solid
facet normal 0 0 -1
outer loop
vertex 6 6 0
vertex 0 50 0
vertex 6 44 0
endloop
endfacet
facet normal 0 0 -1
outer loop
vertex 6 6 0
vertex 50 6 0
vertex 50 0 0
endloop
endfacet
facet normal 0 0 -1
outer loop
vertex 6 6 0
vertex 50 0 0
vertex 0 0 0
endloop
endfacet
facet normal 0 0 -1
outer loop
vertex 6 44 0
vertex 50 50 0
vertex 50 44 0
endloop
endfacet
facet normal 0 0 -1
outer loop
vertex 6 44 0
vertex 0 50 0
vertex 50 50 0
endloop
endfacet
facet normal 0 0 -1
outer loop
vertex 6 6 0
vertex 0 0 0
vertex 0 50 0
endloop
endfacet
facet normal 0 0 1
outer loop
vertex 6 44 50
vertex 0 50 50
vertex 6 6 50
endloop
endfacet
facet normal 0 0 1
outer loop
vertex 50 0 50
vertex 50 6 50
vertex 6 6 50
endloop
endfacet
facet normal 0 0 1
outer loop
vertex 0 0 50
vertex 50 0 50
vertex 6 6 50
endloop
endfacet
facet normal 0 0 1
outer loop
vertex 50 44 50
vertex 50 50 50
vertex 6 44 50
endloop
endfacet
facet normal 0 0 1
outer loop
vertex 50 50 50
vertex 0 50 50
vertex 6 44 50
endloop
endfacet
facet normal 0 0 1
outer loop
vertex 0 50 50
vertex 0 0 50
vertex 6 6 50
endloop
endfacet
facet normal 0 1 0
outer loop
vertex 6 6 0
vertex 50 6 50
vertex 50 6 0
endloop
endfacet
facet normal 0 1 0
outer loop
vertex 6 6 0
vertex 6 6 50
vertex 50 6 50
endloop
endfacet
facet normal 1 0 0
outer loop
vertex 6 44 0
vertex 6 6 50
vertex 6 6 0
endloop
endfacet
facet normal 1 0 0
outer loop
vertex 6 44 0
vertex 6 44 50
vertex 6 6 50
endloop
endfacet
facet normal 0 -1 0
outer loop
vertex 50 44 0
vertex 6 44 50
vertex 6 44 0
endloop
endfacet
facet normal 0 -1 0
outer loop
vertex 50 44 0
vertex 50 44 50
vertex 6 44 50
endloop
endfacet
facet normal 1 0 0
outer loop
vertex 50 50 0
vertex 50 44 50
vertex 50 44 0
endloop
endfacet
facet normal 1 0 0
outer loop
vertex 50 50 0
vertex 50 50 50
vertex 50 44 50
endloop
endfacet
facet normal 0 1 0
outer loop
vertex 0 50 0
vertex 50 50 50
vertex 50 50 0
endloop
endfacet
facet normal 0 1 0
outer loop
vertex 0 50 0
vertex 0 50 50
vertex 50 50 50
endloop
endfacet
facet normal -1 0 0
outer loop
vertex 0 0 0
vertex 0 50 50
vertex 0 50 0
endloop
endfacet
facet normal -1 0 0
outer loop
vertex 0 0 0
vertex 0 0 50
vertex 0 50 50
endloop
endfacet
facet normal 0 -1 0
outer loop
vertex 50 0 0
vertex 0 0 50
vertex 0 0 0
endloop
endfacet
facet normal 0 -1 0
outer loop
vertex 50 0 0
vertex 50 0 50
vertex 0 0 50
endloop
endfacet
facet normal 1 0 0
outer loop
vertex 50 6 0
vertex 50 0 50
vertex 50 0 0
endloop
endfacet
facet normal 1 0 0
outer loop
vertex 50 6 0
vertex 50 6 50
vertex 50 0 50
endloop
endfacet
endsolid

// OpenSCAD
$fn = 32;

// ----------------------------------------------------------------------
// Structural section: channel 50 x 50 mm
// ----------------------------------------------------------------------

// --- parameters (mm) ---
sec_w = 50;               // channel width, X
sec_h = 50;               // channel height, Y
flange_t = 6;             // flange thickness
web_t = 6;                // web thickness
plate_t = 50;             // cut length, Z (extrusion height)

profile = [[0, 0], [50, 0], [50, 6], [6, 6], [6, 44], [50, 44], [50, 50], [0, 50]];  // primary outline, 8 points, counter clockwise

// --- the one profile operation ---
linear_extrude(height = plate_t) polygon(points = profile);
